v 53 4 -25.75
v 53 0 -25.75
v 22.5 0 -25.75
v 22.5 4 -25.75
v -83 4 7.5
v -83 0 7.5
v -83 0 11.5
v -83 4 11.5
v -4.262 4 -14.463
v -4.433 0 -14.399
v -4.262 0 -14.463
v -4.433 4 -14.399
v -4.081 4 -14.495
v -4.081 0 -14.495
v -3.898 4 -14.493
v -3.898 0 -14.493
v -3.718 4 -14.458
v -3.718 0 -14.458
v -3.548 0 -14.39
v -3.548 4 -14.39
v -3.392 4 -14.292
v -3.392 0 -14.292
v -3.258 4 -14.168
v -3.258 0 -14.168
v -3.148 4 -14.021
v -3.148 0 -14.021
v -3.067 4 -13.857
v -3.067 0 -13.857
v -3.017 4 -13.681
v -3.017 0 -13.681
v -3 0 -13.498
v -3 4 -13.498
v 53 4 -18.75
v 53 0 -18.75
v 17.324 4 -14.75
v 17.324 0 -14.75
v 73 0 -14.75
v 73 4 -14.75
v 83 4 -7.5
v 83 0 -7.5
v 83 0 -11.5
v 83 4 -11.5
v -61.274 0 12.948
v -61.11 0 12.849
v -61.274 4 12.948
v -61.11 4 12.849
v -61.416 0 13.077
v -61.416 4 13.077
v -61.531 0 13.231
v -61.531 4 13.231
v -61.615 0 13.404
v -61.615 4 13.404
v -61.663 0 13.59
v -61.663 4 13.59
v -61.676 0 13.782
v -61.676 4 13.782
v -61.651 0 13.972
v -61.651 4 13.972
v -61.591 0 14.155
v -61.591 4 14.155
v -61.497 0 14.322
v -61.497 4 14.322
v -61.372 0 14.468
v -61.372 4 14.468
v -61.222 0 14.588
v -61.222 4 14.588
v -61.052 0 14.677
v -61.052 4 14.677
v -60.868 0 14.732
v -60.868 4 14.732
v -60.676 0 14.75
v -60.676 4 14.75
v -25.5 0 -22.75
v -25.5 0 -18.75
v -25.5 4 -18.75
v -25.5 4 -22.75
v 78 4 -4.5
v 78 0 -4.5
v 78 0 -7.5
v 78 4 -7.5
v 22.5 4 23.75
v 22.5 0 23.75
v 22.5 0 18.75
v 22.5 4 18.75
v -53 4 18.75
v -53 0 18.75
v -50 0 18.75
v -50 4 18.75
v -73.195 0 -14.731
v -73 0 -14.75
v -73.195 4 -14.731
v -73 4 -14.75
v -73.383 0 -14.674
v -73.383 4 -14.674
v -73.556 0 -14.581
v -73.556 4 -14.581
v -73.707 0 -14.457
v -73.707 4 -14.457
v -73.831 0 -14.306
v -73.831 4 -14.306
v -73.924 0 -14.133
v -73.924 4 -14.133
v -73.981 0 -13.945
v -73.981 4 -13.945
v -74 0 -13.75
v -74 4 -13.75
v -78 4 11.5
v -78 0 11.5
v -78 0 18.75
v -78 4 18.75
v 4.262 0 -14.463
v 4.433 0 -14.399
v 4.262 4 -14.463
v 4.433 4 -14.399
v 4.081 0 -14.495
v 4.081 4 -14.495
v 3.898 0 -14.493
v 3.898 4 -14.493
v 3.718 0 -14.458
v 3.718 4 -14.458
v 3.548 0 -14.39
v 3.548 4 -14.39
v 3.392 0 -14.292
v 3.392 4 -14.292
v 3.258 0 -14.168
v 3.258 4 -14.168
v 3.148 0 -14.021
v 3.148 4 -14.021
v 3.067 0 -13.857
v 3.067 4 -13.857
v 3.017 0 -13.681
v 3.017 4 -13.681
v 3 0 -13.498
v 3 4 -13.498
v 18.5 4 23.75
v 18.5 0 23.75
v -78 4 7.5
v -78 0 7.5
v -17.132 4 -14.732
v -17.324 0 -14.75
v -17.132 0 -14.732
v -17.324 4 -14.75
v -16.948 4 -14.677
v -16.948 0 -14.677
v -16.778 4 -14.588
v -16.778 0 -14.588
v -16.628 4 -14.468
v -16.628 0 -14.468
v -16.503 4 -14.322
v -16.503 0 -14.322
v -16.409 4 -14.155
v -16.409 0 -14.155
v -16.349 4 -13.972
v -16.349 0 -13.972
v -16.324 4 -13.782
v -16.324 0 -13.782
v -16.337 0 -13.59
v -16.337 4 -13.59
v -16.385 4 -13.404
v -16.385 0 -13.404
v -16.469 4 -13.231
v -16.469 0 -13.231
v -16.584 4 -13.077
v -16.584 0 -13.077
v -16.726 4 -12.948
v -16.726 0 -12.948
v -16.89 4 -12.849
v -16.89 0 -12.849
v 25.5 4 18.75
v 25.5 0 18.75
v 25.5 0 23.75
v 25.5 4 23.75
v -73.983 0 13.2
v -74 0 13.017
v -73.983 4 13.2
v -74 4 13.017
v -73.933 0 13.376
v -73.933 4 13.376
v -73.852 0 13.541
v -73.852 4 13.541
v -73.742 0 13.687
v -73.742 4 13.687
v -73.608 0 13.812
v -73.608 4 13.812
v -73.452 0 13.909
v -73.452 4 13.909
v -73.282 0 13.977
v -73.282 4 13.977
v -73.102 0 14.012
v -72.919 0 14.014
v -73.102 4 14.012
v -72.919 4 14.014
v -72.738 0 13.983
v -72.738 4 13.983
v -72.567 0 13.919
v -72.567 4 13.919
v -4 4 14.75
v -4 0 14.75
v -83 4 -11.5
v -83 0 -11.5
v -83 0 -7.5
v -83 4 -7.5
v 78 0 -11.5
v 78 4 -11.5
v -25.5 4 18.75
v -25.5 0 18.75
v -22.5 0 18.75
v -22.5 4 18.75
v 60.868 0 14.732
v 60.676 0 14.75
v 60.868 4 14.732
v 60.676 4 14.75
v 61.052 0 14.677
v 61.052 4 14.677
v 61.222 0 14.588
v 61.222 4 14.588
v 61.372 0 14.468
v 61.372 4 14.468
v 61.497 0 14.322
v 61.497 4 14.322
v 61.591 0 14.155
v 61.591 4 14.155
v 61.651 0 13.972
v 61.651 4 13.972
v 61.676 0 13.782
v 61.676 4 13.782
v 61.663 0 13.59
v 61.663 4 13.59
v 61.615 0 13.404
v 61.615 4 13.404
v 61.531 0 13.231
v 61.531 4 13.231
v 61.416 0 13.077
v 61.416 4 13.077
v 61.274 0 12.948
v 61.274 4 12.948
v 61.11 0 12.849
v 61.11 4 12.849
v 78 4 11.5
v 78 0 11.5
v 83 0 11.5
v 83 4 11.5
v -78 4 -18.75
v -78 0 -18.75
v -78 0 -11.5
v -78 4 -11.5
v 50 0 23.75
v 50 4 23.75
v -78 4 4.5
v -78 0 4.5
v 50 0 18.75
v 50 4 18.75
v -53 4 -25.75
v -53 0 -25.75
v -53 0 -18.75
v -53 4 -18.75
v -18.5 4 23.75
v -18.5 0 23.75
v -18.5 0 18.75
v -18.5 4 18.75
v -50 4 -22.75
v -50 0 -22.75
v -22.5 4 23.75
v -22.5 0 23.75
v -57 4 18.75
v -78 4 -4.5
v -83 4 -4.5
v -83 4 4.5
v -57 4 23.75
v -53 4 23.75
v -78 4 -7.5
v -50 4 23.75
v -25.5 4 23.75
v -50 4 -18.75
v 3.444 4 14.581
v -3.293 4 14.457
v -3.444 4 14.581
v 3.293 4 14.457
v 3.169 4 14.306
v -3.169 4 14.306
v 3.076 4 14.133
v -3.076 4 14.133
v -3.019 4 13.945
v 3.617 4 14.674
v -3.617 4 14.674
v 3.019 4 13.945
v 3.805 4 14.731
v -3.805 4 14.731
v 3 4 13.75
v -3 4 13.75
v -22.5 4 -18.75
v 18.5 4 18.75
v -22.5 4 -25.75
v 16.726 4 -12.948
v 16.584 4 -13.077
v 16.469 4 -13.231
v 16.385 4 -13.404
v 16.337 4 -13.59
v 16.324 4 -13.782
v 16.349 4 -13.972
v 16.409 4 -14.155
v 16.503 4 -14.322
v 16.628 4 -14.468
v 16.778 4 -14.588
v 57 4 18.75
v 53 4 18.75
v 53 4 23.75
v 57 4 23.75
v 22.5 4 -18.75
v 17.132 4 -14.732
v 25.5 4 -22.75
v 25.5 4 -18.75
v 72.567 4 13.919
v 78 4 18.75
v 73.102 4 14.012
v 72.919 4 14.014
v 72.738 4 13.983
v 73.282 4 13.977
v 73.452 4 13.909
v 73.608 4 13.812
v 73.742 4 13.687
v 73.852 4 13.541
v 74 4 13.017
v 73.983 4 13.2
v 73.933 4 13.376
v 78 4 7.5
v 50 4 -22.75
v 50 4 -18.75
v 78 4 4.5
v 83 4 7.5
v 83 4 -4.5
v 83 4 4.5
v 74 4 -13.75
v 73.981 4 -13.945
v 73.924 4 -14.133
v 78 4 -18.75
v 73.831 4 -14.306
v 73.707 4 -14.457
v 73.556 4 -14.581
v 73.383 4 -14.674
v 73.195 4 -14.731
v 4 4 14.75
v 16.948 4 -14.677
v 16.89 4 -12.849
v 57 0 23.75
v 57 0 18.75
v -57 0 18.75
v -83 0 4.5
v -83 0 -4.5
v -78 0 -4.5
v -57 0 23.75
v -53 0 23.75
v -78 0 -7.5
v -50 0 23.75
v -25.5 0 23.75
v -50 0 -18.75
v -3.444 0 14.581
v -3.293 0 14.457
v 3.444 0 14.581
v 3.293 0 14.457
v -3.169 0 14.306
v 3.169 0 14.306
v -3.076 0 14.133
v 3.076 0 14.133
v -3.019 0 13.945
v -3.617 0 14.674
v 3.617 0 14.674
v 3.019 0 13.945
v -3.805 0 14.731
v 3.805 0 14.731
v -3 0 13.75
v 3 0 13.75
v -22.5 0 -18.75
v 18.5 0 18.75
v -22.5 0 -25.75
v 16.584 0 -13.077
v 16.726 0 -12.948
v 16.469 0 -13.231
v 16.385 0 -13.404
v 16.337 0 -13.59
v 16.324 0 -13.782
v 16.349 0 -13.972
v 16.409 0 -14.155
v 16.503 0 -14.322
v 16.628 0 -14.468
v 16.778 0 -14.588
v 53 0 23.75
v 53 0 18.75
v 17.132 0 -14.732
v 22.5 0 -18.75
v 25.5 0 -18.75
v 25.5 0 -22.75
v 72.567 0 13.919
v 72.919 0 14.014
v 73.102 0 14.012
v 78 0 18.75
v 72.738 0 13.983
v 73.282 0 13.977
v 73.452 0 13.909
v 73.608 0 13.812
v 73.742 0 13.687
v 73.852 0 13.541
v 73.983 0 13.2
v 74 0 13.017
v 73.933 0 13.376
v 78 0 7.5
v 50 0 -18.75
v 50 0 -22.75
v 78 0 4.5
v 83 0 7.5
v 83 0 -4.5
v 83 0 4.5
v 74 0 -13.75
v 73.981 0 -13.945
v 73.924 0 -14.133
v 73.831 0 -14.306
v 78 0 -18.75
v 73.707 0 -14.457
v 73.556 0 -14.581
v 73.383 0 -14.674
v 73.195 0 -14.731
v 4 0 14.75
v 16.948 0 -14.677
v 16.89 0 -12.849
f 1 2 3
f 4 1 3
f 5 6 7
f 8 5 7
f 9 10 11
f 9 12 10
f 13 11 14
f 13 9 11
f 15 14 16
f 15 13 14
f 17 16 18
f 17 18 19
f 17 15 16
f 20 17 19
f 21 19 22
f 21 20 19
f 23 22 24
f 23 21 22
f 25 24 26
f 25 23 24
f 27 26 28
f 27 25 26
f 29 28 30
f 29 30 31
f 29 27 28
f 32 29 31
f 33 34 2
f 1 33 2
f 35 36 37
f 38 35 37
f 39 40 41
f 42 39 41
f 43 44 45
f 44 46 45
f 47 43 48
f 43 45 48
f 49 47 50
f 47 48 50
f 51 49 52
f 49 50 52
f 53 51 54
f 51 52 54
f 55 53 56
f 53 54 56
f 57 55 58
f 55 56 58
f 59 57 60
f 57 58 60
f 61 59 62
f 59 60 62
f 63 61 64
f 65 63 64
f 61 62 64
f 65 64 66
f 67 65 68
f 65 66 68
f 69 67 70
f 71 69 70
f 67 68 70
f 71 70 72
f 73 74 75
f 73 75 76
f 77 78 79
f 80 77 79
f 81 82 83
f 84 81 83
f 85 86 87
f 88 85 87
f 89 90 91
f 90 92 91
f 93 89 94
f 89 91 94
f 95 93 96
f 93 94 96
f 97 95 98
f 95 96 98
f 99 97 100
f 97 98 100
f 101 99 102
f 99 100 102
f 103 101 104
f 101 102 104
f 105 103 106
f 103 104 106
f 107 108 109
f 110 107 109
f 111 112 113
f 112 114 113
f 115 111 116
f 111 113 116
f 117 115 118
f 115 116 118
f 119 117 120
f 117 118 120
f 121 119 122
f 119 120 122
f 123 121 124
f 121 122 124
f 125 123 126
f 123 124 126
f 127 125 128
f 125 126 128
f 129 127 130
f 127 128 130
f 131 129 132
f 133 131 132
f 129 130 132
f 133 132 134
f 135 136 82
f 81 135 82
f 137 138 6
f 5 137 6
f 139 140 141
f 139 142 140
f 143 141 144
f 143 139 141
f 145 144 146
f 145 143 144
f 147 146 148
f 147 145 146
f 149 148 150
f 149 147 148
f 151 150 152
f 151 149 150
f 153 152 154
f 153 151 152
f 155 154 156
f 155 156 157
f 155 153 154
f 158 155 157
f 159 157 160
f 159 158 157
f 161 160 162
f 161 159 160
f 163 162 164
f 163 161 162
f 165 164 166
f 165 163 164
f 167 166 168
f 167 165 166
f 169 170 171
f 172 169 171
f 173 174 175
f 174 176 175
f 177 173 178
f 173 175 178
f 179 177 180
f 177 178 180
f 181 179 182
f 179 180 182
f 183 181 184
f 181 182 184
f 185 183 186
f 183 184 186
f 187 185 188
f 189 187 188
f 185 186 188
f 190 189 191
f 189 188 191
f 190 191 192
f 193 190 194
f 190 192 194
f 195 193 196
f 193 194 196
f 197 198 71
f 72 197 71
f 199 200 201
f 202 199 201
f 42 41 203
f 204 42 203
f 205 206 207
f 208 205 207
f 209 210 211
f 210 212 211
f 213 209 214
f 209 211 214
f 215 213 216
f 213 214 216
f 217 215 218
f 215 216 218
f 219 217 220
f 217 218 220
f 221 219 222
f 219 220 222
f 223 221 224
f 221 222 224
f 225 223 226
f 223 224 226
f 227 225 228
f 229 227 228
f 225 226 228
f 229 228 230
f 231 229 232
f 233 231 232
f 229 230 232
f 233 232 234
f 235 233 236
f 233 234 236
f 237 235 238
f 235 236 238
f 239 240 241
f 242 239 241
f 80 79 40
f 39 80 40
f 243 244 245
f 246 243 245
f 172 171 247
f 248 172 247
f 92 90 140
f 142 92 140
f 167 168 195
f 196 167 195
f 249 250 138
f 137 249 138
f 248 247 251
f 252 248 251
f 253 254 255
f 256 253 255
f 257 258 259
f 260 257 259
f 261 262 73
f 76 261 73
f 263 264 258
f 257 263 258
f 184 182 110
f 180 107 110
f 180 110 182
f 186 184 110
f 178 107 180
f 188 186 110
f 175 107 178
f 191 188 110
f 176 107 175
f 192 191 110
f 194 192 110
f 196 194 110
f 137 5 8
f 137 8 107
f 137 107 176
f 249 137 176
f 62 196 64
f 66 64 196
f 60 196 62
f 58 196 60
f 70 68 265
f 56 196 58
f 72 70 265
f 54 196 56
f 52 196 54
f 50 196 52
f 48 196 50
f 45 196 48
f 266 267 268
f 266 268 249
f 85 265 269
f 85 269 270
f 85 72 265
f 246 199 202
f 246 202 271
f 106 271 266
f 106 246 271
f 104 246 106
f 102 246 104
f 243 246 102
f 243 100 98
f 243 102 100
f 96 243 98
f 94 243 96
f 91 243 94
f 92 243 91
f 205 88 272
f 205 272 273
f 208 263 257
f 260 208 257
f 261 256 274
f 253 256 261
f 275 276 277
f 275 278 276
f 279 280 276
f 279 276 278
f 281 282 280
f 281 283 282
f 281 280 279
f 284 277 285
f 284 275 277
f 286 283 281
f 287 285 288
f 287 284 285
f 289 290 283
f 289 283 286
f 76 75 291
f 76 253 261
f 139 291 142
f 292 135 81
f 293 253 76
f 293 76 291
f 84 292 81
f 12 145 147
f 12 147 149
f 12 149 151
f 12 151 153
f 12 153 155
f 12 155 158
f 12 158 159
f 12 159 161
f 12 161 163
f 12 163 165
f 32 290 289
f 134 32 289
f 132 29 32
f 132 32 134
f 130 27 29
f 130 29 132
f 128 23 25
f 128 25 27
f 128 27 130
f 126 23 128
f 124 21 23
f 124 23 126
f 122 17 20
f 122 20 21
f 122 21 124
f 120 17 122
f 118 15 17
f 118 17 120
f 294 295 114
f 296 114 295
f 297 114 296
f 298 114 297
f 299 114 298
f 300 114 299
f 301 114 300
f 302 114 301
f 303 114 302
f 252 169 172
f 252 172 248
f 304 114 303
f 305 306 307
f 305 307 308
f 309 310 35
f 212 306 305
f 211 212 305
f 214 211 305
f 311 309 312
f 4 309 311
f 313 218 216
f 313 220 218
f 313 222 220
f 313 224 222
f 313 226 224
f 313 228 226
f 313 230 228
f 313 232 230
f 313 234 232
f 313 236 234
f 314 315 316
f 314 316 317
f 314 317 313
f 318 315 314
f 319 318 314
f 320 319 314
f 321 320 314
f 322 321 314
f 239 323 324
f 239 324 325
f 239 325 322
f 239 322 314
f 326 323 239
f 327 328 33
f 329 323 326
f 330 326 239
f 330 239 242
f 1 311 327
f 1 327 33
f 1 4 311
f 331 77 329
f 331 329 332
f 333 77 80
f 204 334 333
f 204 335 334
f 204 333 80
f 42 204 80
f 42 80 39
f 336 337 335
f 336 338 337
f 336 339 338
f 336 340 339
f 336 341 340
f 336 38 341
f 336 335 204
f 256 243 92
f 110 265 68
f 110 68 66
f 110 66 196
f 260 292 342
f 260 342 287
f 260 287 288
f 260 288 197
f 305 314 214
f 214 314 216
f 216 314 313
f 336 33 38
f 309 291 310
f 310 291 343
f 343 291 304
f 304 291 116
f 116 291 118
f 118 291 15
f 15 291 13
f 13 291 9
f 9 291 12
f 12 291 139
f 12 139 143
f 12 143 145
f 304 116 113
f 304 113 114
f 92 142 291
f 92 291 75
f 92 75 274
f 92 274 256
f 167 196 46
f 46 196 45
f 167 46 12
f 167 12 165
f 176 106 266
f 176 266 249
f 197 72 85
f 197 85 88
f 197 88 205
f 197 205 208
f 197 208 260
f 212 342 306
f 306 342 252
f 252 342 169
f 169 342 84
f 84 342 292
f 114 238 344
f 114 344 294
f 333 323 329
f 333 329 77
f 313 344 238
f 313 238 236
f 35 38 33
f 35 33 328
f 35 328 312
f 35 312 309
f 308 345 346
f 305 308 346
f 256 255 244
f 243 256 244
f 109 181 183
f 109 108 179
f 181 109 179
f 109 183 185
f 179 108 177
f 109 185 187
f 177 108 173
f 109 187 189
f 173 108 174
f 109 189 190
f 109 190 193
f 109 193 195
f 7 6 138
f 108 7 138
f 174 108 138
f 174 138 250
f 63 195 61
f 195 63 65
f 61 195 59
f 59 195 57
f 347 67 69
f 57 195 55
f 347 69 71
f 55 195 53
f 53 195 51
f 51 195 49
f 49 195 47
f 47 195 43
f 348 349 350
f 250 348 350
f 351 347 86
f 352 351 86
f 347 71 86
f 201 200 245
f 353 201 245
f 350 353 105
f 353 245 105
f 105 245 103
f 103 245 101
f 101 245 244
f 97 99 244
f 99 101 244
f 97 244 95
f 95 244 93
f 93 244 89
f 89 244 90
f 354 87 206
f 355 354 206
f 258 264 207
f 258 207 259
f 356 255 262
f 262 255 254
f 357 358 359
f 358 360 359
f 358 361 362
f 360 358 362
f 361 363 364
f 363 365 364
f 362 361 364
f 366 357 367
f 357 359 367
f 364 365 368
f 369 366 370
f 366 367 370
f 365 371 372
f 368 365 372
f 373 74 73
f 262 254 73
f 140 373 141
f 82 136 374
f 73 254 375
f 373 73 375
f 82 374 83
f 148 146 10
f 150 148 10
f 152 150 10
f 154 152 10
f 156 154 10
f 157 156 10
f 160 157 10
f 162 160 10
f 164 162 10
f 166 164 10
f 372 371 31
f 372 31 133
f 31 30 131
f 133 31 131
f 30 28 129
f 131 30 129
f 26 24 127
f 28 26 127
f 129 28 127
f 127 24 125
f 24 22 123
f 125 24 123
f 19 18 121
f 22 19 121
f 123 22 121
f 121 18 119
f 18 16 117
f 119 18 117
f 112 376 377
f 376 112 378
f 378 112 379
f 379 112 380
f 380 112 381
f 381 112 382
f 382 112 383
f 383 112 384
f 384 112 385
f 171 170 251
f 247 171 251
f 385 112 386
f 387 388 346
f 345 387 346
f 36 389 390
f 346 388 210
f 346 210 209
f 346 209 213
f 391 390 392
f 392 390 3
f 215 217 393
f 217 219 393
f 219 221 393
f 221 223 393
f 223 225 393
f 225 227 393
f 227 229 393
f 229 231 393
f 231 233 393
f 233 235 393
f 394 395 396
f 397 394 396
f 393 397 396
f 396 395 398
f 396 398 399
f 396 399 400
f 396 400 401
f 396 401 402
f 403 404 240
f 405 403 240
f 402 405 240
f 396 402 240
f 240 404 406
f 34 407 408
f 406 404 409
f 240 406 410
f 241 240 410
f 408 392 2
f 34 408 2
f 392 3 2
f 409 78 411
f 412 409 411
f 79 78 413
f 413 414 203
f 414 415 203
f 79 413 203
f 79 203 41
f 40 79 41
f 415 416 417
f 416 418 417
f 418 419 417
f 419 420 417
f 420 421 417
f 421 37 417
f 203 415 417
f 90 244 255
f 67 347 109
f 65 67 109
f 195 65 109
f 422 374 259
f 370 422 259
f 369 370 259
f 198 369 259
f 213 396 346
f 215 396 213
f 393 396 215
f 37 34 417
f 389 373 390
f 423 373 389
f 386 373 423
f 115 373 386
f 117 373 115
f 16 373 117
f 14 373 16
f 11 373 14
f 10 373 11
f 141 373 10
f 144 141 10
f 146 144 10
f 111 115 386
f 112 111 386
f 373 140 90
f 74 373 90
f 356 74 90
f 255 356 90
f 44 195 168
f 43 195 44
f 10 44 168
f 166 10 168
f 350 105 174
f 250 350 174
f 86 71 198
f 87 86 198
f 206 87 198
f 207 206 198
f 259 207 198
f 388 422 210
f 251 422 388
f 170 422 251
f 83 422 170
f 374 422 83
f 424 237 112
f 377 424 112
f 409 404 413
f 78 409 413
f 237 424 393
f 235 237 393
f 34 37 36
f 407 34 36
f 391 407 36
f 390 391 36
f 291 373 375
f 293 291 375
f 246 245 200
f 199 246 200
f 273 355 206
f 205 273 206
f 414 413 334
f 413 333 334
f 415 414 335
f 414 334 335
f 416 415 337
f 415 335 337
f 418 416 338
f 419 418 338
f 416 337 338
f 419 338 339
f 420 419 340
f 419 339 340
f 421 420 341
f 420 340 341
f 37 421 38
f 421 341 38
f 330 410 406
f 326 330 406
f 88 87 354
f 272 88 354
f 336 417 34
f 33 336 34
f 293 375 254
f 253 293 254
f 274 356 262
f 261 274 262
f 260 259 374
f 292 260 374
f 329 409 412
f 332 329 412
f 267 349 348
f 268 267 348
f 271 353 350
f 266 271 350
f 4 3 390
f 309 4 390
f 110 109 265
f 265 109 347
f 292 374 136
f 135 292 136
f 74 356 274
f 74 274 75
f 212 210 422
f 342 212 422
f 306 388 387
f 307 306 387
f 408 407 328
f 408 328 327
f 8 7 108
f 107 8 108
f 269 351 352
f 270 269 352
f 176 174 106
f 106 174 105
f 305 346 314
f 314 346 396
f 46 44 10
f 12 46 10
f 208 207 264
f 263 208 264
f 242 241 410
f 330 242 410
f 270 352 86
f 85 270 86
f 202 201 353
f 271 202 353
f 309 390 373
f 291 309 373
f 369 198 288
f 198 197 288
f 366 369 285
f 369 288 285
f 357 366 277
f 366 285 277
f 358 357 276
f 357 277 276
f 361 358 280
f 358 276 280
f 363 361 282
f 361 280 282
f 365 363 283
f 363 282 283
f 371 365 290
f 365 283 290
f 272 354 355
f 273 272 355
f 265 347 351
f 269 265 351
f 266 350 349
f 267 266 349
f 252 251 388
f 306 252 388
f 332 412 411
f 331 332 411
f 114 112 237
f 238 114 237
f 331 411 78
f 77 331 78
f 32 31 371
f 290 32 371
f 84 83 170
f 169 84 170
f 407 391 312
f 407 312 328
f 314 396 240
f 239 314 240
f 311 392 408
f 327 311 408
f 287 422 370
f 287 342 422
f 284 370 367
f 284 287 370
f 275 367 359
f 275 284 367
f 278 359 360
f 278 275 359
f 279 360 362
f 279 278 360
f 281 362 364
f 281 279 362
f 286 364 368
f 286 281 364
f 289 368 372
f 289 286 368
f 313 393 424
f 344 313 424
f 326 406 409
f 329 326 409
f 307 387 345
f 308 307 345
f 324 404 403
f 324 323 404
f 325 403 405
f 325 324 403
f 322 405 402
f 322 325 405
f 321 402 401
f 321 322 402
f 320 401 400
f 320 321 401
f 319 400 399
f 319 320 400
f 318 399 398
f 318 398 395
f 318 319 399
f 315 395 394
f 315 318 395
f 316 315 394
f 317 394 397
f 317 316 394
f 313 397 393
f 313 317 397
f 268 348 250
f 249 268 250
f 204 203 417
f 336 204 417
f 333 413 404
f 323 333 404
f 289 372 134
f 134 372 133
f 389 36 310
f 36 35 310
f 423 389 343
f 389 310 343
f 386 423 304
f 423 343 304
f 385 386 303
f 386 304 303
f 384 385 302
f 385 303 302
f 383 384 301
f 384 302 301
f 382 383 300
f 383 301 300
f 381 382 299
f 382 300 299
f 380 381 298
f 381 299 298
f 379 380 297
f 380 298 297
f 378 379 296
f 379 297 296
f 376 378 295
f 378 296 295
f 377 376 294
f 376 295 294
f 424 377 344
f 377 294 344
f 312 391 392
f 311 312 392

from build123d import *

# Parameters (mm, degrees)
SKETCH1_W           = 24.5
SKETCH1_H           = 4
BOSS_EXTRUDE1_DEPTH = 4
FILLET1_R           = 1


with BuildPart() as part:
    # Sketch1 → Boss-Extrude1 (new body)
    with BuildSketch(Plane(origin=(0, 0, 0), x_dir=(1, 0, 0), z_dir=(0, 1, 0))):
        Polygon((-53, 18.75), (-78, 18.75), (-78, 11.5), (-83, 11.5), (-83, 7.5), (-78, 7.5), (-78, 4.5), (-83, 4.5), (-83, -4.5), (-78, -4.5), (-78, -7.5), (-83, -7.5), (-83, -11.5), (-78, -11.5), (-78, -18.75), (-57, -18.75), (-57, -23.75), (-53, -23.75), (-53, -18.75), (-50, -18.75), (-50, -23.75), (-25.5, -23.75), (-25.5, -18.75), (-22.5, -18.75), (-22.5, -23.75), (-18.5, -23.75), (-18.5, -18.75), (18.5, -18.75), (18.5, -23.75), (22.5, -23.75), (22.5, -18.75), (25.5, -18.75), (25.5, -23.75), (50, -23.75), (50, -18.75), (53, -18.75), (53, -23.75), (57, -23.75), (57, -18.75), (78, -18.75), (78, -11.5), (83, -11.5), (83, -7.5), (78, -7.5), (78, -4.5), (83, -4.5), (83, 4.5), (78, 4.5), (78, 7.5), (83, 7.5), (83, 11.5), (78, 11.5), (78, 18.75), (53, 18.75), (53, 25.75), (22.5, 25.75), (22.5, 18.75), (-22.5, 18.75), (-22.5, 25.75), (-53, 25.75), align=None)
        with Locations((37.75, 20.75)):
            Rectangle(SKETCH1_W, SKETCH1_H, mode=Mode.SUBTRACT)
        with Locations((-37.75, 20.75)):
            Rectangle(SKETCH1_W, SKETCH1_H, mode=Mode.SUBTRACT)
        Polygon((-12.935798956, 14.75), (-74, -14.607788964), (-74, 14.75), align=None, mode=Mode.SUBTRACT)
        Polygon((-3, 15.088558194), (-3, -14.75), (-65.064201044, -14.75), align=None, mode=Mode.SUBTRACT)
        Polygon((3, -14.75), (3, 15.088558194), (65.064201044, -14.75), align=None, mode=Mode.SUBTRACT)
        Polygon((74, -14.607788964), (12.935798956, 14.75), (74, 14.75), align=None, mode=Mode.SUBTRACT)
    extrude(amount=BOSS_EXTRUDE1_DEPTH)

    # Fillet1
    fillet1_edges = [part.edges().sort_by_distance(p)[0] for p in [
        (-74, 2, 14.607788964),
        (-12.935798956, 2, -14.75),
        (-74, 2, -14.75),
        (65.064201044, 2, 14.75),
        (3, 2, -15.088558194),
        (3, 2, 14.75),
        (12.935798956, 2, -14.75),
        (74, 2, 14.607788964),
        (74, 2, -14.75),
        (-65.064201044, 2, 14.75),
        (-3, 2, 14.75),
        (-3, 2, -15.088558194),
    ]]
    fillet(fillet1_edges, radius=FILLET1_R)


solid = part.part
